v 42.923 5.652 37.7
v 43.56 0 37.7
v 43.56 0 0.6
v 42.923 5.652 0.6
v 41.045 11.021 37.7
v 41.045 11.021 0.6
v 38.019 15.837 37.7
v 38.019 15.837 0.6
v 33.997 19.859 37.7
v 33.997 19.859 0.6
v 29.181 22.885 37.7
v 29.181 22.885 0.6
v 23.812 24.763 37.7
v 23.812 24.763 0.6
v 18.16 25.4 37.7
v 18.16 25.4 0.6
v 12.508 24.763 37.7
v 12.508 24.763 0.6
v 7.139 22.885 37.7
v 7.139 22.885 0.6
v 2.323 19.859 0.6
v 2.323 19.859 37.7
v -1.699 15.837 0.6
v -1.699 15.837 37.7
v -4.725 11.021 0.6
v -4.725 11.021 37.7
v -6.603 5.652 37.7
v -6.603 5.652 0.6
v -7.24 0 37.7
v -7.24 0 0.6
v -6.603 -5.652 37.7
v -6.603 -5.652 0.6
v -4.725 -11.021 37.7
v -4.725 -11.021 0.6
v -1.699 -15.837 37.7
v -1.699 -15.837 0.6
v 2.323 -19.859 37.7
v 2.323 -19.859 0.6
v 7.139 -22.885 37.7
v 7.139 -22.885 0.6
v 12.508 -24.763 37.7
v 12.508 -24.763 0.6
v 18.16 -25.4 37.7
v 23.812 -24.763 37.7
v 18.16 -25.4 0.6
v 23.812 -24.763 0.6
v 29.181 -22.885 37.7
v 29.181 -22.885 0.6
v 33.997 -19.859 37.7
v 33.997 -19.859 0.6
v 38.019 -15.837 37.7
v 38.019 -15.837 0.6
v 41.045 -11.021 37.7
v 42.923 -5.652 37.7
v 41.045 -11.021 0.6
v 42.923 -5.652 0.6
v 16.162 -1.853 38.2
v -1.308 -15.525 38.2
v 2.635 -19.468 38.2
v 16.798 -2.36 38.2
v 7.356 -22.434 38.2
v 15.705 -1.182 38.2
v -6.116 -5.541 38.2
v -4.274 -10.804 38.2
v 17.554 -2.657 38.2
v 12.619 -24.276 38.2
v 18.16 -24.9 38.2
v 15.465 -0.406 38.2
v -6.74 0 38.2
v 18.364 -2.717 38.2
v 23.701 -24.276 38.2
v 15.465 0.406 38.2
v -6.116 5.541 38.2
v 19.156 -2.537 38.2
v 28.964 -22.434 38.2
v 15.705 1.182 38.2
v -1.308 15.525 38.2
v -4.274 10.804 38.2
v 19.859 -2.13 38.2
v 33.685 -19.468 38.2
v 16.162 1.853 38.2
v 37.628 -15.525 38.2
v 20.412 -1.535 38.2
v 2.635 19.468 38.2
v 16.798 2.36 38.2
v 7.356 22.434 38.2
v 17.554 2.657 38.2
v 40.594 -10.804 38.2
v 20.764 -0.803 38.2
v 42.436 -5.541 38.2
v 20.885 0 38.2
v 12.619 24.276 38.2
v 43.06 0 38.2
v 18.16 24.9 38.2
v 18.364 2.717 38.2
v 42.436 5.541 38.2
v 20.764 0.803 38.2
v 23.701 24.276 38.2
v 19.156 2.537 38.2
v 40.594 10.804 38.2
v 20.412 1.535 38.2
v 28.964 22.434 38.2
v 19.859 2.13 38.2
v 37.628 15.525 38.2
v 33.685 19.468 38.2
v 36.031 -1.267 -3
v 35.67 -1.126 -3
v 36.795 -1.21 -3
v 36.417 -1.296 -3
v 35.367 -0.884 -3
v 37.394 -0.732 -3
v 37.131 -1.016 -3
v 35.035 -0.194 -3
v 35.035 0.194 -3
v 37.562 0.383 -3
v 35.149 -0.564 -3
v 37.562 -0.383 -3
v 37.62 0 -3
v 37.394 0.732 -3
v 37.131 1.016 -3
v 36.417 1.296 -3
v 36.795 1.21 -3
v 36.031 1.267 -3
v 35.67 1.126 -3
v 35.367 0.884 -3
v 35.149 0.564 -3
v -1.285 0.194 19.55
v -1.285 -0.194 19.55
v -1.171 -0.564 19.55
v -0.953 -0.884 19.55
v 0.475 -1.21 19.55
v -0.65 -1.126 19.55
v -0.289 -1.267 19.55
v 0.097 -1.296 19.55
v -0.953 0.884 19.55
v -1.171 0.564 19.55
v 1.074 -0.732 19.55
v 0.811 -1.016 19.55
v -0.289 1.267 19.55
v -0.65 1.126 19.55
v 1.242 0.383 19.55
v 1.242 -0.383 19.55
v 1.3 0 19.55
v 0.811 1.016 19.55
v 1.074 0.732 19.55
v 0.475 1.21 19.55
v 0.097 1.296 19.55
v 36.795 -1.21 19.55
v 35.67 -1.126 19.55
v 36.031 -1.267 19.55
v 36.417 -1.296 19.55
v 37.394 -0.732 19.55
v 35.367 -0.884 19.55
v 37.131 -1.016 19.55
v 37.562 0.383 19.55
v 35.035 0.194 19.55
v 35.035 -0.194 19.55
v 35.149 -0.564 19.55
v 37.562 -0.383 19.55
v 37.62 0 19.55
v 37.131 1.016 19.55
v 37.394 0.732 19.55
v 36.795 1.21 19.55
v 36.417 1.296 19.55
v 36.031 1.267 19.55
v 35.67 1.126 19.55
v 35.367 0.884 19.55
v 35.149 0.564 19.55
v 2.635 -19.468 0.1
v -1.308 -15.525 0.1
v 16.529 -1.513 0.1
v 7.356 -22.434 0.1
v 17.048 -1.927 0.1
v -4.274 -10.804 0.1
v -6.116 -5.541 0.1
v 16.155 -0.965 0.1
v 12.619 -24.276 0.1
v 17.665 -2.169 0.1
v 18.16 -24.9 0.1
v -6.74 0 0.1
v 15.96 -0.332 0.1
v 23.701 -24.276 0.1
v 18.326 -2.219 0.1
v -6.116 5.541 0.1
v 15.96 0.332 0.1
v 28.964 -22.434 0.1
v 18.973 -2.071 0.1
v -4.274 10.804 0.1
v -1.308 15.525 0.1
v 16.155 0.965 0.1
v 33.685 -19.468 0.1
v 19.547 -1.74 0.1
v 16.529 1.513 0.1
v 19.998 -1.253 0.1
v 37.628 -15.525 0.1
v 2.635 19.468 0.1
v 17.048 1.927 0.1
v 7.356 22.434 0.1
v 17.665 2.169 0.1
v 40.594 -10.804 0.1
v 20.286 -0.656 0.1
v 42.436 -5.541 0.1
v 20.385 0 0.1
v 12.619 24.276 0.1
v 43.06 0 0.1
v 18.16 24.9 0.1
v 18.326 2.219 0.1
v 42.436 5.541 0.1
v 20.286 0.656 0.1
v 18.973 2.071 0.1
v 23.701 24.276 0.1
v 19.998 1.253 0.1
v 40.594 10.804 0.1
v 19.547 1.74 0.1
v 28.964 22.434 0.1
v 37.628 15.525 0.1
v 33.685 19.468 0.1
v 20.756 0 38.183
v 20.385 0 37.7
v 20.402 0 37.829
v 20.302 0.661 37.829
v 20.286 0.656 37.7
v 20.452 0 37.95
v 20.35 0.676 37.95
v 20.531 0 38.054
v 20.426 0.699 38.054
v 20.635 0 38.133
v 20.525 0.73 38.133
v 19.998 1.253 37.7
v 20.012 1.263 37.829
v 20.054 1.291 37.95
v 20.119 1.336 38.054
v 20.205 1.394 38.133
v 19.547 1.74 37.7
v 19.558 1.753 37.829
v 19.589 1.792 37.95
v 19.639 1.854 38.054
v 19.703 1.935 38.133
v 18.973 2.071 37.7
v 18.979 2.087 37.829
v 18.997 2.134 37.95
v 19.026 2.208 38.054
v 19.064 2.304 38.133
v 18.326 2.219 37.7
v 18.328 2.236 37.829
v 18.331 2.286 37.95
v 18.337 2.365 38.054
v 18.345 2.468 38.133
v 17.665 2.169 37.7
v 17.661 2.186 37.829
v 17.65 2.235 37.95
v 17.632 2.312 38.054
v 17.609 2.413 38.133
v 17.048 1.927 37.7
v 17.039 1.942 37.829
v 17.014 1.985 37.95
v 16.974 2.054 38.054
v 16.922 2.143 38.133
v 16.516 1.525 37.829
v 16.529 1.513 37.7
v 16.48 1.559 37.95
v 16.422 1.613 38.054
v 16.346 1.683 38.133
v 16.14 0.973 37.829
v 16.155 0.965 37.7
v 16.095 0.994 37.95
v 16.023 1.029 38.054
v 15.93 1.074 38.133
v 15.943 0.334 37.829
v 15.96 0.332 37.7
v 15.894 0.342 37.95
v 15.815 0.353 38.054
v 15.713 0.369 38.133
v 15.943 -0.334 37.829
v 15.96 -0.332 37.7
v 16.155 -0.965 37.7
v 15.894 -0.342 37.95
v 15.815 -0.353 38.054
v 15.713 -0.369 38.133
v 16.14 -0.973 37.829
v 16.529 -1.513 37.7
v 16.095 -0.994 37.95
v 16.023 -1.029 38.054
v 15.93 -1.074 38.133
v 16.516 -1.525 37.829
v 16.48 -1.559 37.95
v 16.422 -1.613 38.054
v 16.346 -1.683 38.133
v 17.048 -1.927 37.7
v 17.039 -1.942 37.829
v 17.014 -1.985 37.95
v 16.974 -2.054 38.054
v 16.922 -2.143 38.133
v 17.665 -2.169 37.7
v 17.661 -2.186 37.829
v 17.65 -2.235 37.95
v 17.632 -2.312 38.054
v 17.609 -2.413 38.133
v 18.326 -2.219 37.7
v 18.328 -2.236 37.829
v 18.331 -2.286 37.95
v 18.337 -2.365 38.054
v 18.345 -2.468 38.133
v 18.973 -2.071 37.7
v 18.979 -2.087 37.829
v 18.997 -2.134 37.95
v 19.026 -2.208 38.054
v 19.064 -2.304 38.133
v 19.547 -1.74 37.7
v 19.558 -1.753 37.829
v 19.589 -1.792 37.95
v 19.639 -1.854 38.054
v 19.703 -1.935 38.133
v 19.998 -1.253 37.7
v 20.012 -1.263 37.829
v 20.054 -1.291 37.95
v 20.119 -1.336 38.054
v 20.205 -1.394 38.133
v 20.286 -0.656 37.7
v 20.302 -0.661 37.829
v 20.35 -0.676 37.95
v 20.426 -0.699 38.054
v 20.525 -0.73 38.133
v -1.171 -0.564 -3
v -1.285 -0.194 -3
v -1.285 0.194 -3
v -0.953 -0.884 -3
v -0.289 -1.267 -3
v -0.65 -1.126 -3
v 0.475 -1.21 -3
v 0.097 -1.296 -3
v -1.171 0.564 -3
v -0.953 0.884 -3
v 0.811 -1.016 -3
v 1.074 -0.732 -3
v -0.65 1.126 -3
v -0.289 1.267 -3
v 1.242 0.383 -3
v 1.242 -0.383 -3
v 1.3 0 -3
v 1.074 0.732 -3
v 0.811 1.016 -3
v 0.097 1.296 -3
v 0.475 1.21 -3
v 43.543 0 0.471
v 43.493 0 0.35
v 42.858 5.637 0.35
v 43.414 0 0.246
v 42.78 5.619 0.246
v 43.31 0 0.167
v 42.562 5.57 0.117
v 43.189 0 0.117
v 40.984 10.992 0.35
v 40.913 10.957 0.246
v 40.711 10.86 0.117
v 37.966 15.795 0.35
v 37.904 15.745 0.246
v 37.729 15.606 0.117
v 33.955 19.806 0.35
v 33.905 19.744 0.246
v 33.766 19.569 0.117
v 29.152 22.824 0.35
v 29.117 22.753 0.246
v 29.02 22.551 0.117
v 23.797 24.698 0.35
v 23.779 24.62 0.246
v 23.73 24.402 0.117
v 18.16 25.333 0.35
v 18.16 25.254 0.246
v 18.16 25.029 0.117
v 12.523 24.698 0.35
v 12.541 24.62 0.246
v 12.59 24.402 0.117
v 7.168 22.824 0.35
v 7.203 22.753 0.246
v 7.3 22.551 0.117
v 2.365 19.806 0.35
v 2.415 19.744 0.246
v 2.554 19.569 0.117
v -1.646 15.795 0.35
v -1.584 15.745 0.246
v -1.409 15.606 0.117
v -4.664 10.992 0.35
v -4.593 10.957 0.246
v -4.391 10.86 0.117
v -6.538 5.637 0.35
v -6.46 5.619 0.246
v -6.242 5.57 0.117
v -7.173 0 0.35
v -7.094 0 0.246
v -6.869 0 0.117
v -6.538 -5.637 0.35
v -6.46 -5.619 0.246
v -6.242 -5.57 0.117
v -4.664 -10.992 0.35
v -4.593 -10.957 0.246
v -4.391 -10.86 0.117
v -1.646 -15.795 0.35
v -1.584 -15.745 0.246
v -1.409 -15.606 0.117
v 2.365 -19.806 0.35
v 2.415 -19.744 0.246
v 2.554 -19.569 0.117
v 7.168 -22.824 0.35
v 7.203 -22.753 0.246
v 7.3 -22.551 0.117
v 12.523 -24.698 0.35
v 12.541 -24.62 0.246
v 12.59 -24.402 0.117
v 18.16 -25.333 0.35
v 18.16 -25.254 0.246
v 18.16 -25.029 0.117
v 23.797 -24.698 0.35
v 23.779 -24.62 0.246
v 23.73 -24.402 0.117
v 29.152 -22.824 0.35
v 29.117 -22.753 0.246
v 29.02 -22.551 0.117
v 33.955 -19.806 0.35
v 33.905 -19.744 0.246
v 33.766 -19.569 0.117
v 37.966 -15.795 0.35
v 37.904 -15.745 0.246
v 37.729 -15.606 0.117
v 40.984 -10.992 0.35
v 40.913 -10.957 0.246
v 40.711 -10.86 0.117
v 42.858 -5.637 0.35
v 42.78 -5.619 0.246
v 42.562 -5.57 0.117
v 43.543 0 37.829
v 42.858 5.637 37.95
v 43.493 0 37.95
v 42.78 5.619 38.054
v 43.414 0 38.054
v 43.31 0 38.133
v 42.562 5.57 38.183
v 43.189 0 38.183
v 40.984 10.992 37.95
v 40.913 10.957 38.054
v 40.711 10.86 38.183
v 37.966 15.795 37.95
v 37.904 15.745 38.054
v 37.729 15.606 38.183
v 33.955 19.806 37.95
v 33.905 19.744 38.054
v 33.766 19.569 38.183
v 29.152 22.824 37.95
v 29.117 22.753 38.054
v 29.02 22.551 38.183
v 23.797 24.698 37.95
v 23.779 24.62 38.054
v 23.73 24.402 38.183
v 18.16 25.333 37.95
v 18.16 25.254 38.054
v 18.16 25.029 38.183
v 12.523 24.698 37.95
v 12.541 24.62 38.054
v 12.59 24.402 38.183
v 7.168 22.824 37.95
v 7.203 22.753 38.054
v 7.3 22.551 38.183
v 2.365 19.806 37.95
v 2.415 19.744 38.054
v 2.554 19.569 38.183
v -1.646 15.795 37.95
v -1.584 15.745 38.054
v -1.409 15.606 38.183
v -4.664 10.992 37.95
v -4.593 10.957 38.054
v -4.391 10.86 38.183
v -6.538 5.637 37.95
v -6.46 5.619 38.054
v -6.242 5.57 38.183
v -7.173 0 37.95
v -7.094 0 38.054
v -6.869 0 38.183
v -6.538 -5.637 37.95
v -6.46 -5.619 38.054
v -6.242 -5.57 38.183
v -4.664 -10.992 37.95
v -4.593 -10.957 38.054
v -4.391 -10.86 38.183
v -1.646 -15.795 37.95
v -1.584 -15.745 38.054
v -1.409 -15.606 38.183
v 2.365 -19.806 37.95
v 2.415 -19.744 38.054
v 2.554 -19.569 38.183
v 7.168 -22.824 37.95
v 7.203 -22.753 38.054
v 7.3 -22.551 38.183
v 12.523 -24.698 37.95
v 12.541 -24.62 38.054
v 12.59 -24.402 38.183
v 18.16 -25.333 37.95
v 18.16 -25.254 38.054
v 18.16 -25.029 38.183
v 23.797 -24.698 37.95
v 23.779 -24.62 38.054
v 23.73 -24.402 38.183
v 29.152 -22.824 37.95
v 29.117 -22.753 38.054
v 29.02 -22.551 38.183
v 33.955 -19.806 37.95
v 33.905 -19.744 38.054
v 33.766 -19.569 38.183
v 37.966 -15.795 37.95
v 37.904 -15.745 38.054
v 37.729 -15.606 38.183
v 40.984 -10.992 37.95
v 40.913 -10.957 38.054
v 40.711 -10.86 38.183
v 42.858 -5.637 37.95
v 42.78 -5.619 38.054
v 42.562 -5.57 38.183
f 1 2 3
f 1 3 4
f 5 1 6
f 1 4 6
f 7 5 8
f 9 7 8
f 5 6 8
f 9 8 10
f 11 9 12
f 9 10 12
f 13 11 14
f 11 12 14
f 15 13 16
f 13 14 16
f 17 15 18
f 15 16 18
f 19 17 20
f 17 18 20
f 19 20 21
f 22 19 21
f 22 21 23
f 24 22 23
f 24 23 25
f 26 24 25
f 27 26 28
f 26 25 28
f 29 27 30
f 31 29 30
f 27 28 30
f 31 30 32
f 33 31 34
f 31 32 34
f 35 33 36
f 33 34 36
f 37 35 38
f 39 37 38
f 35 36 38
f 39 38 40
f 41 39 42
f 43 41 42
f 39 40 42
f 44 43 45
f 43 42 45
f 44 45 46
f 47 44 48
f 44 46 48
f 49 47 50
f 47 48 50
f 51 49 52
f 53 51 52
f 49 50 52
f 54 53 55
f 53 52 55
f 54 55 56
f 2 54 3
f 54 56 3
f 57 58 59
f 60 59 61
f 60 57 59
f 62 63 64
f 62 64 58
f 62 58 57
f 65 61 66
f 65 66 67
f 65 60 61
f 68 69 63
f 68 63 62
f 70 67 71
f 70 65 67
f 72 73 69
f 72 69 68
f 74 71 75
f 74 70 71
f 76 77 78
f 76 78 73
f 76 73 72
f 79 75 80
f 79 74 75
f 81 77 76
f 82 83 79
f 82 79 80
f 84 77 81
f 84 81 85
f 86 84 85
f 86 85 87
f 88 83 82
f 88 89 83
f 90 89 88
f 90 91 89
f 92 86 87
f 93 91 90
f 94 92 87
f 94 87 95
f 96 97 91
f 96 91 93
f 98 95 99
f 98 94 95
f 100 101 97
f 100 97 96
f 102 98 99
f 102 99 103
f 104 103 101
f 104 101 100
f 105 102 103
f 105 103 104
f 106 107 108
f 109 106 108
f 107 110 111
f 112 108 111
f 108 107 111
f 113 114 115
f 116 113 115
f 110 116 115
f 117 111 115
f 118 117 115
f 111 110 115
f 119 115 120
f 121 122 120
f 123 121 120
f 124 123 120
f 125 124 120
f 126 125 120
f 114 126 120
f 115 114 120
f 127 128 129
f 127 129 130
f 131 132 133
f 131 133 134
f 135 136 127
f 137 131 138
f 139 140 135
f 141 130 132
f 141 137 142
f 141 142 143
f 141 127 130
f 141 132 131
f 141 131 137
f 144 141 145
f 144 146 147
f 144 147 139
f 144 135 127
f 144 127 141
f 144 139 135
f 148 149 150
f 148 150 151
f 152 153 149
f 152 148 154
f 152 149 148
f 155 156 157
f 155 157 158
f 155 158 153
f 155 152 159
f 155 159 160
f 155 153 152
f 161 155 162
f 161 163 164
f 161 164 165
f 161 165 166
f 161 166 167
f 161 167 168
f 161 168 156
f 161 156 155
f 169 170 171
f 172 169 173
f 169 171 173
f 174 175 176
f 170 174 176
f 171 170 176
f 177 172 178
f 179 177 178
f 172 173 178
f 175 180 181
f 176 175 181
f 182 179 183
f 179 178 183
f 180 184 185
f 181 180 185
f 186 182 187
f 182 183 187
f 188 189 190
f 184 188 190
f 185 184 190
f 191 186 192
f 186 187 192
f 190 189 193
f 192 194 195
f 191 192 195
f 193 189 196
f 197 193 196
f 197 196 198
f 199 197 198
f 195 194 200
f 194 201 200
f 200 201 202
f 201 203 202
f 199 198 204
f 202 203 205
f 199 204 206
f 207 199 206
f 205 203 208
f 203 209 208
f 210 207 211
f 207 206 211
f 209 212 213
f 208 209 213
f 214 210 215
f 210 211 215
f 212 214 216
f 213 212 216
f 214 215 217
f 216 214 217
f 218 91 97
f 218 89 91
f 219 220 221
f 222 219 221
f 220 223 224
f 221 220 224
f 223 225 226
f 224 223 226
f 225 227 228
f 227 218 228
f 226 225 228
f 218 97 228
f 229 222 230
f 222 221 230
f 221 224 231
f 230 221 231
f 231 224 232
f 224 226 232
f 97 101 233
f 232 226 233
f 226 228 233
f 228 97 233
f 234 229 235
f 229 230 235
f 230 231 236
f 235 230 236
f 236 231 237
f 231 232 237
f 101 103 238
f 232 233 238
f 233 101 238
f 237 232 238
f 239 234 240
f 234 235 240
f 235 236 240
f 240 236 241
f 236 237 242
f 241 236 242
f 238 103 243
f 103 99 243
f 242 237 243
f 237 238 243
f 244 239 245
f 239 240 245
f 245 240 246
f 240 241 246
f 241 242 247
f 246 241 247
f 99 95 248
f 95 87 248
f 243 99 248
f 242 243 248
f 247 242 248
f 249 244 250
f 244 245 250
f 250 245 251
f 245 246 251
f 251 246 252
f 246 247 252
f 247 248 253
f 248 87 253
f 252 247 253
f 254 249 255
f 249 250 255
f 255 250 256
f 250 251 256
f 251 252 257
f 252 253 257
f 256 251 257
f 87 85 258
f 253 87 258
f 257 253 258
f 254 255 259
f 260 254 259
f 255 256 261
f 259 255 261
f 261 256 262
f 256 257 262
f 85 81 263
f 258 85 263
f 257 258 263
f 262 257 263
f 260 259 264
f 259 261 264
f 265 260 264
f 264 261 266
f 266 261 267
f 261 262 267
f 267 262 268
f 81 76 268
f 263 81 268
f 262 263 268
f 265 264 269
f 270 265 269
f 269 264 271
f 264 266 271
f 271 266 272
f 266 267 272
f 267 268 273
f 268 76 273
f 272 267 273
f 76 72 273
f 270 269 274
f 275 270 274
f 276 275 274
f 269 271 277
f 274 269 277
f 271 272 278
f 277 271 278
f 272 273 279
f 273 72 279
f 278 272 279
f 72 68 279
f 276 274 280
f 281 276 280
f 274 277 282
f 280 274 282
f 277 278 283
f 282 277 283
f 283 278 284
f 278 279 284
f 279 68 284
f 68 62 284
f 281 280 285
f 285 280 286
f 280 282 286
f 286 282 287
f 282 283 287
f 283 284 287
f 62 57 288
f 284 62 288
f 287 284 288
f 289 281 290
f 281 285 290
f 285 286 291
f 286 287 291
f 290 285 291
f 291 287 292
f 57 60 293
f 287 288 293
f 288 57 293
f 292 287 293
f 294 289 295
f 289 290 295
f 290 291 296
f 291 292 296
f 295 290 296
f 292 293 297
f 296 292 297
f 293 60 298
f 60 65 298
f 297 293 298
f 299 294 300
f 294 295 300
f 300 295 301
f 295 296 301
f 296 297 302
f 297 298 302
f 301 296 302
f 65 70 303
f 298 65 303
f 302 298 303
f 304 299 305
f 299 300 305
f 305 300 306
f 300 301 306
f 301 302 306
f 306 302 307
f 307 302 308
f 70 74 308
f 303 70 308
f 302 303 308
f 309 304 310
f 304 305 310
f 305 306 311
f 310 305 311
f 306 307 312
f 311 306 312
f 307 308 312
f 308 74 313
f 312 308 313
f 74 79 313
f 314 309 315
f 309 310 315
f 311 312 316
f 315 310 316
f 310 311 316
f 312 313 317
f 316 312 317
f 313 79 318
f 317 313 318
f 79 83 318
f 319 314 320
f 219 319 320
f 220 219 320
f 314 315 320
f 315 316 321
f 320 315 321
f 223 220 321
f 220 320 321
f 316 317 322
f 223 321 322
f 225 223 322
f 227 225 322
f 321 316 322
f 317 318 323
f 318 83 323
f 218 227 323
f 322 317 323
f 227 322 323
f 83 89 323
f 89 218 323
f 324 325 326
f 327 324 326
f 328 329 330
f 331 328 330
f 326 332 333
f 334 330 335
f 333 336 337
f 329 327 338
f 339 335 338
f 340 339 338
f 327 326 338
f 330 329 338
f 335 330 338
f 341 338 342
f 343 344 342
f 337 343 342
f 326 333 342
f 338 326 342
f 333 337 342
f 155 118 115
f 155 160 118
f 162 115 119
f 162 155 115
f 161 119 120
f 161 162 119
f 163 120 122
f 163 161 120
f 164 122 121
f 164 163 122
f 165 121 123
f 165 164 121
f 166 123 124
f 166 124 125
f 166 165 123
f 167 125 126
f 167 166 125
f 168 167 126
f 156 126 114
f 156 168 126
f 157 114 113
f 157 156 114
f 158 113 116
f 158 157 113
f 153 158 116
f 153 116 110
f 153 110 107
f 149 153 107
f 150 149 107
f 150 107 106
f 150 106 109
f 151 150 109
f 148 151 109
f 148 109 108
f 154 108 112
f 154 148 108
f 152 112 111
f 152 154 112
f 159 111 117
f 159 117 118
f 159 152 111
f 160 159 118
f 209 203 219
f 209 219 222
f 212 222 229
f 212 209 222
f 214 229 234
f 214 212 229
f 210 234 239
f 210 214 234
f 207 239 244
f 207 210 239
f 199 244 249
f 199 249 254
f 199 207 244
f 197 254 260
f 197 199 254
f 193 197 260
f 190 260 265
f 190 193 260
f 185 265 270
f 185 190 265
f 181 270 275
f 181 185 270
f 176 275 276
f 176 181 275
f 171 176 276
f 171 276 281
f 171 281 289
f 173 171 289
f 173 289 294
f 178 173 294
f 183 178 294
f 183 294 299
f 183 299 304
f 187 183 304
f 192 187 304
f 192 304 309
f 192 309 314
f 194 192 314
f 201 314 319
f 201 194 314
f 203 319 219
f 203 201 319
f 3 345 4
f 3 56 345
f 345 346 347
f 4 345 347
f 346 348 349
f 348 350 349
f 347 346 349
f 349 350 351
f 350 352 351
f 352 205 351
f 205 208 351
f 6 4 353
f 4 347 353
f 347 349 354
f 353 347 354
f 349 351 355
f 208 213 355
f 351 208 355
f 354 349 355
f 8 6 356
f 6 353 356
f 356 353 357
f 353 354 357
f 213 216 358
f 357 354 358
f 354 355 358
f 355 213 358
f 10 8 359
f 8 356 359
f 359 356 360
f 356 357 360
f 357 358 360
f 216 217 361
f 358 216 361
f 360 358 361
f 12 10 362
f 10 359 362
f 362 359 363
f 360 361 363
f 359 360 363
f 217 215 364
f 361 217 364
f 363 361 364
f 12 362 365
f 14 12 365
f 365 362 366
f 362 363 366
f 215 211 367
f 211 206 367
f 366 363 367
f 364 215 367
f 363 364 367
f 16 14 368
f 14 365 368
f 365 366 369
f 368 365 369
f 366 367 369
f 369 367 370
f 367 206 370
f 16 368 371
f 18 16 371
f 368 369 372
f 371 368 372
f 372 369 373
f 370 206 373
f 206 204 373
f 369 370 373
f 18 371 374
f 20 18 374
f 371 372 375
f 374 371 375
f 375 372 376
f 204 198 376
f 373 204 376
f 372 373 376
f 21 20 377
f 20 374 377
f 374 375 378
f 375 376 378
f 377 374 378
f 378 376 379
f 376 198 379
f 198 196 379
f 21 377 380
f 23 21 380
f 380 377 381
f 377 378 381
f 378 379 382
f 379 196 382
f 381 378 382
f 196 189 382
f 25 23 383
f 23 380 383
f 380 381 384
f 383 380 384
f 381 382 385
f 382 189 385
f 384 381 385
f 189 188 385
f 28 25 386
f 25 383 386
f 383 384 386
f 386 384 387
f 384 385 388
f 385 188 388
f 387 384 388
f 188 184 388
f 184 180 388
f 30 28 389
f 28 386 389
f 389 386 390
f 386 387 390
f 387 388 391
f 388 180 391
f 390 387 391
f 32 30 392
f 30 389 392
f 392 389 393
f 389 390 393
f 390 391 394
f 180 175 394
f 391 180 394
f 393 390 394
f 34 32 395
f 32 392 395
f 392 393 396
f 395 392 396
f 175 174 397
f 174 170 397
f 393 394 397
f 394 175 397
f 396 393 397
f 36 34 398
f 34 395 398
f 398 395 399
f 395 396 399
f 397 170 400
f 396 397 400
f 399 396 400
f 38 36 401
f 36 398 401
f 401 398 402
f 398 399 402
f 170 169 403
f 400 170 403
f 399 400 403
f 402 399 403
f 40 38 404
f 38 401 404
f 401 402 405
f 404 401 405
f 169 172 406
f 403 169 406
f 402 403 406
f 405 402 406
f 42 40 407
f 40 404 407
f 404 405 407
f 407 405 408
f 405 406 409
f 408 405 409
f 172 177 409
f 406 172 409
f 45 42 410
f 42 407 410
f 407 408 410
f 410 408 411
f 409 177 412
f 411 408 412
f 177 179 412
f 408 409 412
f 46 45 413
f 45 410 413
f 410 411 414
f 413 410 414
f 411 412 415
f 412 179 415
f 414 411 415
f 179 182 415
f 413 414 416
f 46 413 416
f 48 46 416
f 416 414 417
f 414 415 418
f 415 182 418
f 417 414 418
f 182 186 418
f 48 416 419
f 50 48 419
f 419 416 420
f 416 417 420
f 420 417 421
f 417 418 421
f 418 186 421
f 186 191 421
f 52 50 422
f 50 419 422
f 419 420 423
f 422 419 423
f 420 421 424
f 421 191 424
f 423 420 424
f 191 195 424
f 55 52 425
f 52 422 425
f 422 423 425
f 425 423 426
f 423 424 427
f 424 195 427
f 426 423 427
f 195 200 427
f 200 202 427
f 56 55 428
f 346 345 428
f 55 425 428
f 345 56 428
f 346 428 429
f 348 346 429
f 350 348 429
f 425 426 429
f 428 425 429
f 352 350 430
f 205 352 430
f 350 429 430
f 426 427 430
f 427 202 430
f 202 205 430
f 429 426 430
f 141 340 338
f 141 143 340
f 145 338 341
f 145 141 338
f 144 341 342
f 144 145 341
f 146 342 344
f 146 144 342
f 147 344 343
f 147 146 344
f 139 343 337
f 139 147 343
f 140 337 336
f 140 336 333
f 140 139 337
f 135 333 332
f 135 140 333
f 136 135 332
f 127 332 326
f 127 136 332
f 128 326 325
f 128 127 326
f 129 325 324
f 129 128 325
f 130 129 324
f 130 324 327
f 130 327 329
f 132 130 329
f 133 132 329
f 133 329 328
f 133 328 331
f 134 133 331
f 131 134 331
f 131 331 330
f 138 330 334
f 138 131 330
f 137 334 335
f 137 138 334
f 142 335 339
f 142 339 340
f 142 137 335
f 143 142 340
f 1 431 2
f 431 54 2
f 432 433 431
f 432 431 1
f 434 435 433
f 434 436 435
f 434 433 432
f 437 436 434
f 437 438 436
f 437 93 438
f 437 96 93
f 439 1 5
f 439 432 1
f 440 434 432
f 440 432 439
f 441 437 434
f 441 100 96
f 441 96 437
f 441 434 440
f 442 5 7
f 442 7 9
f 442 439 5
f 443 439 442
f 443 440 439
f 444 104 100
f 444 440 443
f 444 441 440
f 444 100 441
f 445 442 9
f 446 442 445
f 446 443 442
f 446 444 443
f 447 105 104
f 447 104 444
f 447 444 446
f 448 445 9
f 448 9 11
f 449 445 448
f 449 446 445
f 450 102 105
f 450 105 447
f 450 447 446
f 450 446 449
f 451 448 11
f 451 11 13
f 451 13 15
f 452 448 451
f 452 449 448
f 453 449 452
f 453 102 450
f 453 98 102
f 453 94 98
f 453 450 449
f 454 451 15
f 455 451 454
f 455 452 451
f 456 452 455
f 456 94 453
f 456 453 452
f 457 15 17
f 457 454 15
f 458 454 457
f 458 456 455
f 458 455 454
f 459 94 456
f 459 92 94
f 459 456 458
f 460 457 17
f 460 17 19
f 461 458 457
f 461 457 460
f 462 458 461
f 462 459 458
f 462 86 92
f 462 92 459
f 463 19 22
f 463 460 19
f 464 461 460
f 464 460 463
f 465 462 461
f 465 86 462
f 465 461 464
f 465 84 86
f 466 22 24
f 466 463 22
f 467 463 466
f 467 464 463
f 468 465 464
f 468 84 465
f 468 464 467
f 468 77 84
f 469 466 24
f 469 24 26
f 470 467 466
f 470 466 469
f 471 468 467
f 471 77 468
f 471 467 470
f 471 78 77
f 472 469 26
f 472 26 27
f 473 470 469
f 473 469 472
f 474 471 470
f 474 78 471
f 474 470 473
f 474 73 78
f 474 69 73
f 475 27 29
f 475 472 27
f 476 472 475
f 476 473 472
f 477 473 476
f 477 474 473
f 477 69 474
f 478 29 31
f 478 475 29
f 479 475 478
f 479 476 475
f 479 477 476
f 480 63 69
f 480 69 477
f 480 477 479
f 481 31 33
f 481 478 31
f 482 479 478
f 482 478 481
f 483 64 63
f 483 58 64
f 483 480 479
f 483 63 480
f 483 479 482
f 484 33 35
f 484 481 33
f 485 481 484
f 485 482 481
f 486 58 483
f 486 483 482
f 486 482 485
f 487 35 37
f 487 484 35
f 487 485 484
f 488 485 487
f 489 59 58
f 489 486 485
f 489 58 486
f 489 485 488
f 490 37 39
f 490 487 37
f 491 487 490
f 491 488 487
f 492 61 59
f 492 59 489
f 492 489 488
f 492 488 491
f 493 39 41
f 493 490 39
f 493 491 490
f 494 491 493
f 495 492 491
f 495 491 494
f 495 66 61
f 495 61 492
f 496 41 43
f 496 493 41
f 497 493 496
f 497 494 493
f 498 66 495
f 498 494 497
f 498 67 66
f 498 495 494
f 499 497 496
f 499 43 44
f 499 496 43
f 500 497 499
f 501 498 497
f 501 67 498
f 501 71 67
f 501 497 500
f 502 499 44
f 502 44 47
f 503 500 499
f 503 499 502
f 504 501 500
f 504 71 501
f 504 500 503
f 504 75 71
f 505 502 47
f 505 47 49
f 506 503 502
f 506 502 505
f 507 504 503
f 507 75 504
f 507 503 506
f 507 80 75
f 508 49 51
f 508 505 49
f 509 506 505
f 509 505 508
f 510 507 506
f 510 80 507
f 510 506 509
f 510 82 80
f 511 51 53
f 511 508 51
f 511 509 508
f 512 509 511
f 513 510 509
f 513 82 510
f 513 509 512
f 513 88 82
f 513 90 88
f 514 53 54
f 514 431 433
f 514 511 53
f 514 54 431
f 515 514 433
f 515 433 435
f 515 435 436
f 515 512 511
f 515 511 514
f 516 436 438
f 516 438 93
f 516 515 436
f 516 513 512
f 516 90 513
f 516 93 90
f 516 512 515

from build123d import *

# Parameters (mm, degrees)
SKETCH001_R       = 1.3
PAD001_DEPTH      = 19.05
PAD001_DEPTH_BACK = 3.5
SKETCH_R          = 25.4
SKETCH_R_2        = 2.225
PAD_DEPTH         = 38.1
FILLET_R          = 0.5


with BuildPart() as pad001:
    # Sketch001 → Pad001 (new body, two sides)
    with BuildSketch(Plane.XY.offset(0.5)) as pad001_sk:
        Circle(SKETCH001_R)
        with Locations((36.32, 0)):
            Circle(SKETCH001_R)
    extrude(amount=PAD001_DEPTH)
    extrude(pad001_sk.sketch, amount=-PAD001_DEPTH_BACK)


with BuildPart() as fillet_body:
    # Sketch → Pad (new body)
    with BuildSketch(Plane.XY.offset(0.1)):
        with Locations((18.16, 0)):
            Circle(SKETCH_R)
        with Locations((18.16, 0)):
            Circle(SKETCH_R_2, mode=Mode.SUBTRACT)
    extrude(amount=PAD_DEPTH)

    # Fillet
    fillet_edges = [fillet_body.edges().sort_by_distance(p)[0] for p in [
        (15.935, 0, 38.2),
        (-7.24, 0, 38.2),
        (-7.24, 0, 0.1),
    ]]
    fillet(fillet_edges, radius=FILLET_R)


solid = Compound([pad001.part, fillet_body.part])
